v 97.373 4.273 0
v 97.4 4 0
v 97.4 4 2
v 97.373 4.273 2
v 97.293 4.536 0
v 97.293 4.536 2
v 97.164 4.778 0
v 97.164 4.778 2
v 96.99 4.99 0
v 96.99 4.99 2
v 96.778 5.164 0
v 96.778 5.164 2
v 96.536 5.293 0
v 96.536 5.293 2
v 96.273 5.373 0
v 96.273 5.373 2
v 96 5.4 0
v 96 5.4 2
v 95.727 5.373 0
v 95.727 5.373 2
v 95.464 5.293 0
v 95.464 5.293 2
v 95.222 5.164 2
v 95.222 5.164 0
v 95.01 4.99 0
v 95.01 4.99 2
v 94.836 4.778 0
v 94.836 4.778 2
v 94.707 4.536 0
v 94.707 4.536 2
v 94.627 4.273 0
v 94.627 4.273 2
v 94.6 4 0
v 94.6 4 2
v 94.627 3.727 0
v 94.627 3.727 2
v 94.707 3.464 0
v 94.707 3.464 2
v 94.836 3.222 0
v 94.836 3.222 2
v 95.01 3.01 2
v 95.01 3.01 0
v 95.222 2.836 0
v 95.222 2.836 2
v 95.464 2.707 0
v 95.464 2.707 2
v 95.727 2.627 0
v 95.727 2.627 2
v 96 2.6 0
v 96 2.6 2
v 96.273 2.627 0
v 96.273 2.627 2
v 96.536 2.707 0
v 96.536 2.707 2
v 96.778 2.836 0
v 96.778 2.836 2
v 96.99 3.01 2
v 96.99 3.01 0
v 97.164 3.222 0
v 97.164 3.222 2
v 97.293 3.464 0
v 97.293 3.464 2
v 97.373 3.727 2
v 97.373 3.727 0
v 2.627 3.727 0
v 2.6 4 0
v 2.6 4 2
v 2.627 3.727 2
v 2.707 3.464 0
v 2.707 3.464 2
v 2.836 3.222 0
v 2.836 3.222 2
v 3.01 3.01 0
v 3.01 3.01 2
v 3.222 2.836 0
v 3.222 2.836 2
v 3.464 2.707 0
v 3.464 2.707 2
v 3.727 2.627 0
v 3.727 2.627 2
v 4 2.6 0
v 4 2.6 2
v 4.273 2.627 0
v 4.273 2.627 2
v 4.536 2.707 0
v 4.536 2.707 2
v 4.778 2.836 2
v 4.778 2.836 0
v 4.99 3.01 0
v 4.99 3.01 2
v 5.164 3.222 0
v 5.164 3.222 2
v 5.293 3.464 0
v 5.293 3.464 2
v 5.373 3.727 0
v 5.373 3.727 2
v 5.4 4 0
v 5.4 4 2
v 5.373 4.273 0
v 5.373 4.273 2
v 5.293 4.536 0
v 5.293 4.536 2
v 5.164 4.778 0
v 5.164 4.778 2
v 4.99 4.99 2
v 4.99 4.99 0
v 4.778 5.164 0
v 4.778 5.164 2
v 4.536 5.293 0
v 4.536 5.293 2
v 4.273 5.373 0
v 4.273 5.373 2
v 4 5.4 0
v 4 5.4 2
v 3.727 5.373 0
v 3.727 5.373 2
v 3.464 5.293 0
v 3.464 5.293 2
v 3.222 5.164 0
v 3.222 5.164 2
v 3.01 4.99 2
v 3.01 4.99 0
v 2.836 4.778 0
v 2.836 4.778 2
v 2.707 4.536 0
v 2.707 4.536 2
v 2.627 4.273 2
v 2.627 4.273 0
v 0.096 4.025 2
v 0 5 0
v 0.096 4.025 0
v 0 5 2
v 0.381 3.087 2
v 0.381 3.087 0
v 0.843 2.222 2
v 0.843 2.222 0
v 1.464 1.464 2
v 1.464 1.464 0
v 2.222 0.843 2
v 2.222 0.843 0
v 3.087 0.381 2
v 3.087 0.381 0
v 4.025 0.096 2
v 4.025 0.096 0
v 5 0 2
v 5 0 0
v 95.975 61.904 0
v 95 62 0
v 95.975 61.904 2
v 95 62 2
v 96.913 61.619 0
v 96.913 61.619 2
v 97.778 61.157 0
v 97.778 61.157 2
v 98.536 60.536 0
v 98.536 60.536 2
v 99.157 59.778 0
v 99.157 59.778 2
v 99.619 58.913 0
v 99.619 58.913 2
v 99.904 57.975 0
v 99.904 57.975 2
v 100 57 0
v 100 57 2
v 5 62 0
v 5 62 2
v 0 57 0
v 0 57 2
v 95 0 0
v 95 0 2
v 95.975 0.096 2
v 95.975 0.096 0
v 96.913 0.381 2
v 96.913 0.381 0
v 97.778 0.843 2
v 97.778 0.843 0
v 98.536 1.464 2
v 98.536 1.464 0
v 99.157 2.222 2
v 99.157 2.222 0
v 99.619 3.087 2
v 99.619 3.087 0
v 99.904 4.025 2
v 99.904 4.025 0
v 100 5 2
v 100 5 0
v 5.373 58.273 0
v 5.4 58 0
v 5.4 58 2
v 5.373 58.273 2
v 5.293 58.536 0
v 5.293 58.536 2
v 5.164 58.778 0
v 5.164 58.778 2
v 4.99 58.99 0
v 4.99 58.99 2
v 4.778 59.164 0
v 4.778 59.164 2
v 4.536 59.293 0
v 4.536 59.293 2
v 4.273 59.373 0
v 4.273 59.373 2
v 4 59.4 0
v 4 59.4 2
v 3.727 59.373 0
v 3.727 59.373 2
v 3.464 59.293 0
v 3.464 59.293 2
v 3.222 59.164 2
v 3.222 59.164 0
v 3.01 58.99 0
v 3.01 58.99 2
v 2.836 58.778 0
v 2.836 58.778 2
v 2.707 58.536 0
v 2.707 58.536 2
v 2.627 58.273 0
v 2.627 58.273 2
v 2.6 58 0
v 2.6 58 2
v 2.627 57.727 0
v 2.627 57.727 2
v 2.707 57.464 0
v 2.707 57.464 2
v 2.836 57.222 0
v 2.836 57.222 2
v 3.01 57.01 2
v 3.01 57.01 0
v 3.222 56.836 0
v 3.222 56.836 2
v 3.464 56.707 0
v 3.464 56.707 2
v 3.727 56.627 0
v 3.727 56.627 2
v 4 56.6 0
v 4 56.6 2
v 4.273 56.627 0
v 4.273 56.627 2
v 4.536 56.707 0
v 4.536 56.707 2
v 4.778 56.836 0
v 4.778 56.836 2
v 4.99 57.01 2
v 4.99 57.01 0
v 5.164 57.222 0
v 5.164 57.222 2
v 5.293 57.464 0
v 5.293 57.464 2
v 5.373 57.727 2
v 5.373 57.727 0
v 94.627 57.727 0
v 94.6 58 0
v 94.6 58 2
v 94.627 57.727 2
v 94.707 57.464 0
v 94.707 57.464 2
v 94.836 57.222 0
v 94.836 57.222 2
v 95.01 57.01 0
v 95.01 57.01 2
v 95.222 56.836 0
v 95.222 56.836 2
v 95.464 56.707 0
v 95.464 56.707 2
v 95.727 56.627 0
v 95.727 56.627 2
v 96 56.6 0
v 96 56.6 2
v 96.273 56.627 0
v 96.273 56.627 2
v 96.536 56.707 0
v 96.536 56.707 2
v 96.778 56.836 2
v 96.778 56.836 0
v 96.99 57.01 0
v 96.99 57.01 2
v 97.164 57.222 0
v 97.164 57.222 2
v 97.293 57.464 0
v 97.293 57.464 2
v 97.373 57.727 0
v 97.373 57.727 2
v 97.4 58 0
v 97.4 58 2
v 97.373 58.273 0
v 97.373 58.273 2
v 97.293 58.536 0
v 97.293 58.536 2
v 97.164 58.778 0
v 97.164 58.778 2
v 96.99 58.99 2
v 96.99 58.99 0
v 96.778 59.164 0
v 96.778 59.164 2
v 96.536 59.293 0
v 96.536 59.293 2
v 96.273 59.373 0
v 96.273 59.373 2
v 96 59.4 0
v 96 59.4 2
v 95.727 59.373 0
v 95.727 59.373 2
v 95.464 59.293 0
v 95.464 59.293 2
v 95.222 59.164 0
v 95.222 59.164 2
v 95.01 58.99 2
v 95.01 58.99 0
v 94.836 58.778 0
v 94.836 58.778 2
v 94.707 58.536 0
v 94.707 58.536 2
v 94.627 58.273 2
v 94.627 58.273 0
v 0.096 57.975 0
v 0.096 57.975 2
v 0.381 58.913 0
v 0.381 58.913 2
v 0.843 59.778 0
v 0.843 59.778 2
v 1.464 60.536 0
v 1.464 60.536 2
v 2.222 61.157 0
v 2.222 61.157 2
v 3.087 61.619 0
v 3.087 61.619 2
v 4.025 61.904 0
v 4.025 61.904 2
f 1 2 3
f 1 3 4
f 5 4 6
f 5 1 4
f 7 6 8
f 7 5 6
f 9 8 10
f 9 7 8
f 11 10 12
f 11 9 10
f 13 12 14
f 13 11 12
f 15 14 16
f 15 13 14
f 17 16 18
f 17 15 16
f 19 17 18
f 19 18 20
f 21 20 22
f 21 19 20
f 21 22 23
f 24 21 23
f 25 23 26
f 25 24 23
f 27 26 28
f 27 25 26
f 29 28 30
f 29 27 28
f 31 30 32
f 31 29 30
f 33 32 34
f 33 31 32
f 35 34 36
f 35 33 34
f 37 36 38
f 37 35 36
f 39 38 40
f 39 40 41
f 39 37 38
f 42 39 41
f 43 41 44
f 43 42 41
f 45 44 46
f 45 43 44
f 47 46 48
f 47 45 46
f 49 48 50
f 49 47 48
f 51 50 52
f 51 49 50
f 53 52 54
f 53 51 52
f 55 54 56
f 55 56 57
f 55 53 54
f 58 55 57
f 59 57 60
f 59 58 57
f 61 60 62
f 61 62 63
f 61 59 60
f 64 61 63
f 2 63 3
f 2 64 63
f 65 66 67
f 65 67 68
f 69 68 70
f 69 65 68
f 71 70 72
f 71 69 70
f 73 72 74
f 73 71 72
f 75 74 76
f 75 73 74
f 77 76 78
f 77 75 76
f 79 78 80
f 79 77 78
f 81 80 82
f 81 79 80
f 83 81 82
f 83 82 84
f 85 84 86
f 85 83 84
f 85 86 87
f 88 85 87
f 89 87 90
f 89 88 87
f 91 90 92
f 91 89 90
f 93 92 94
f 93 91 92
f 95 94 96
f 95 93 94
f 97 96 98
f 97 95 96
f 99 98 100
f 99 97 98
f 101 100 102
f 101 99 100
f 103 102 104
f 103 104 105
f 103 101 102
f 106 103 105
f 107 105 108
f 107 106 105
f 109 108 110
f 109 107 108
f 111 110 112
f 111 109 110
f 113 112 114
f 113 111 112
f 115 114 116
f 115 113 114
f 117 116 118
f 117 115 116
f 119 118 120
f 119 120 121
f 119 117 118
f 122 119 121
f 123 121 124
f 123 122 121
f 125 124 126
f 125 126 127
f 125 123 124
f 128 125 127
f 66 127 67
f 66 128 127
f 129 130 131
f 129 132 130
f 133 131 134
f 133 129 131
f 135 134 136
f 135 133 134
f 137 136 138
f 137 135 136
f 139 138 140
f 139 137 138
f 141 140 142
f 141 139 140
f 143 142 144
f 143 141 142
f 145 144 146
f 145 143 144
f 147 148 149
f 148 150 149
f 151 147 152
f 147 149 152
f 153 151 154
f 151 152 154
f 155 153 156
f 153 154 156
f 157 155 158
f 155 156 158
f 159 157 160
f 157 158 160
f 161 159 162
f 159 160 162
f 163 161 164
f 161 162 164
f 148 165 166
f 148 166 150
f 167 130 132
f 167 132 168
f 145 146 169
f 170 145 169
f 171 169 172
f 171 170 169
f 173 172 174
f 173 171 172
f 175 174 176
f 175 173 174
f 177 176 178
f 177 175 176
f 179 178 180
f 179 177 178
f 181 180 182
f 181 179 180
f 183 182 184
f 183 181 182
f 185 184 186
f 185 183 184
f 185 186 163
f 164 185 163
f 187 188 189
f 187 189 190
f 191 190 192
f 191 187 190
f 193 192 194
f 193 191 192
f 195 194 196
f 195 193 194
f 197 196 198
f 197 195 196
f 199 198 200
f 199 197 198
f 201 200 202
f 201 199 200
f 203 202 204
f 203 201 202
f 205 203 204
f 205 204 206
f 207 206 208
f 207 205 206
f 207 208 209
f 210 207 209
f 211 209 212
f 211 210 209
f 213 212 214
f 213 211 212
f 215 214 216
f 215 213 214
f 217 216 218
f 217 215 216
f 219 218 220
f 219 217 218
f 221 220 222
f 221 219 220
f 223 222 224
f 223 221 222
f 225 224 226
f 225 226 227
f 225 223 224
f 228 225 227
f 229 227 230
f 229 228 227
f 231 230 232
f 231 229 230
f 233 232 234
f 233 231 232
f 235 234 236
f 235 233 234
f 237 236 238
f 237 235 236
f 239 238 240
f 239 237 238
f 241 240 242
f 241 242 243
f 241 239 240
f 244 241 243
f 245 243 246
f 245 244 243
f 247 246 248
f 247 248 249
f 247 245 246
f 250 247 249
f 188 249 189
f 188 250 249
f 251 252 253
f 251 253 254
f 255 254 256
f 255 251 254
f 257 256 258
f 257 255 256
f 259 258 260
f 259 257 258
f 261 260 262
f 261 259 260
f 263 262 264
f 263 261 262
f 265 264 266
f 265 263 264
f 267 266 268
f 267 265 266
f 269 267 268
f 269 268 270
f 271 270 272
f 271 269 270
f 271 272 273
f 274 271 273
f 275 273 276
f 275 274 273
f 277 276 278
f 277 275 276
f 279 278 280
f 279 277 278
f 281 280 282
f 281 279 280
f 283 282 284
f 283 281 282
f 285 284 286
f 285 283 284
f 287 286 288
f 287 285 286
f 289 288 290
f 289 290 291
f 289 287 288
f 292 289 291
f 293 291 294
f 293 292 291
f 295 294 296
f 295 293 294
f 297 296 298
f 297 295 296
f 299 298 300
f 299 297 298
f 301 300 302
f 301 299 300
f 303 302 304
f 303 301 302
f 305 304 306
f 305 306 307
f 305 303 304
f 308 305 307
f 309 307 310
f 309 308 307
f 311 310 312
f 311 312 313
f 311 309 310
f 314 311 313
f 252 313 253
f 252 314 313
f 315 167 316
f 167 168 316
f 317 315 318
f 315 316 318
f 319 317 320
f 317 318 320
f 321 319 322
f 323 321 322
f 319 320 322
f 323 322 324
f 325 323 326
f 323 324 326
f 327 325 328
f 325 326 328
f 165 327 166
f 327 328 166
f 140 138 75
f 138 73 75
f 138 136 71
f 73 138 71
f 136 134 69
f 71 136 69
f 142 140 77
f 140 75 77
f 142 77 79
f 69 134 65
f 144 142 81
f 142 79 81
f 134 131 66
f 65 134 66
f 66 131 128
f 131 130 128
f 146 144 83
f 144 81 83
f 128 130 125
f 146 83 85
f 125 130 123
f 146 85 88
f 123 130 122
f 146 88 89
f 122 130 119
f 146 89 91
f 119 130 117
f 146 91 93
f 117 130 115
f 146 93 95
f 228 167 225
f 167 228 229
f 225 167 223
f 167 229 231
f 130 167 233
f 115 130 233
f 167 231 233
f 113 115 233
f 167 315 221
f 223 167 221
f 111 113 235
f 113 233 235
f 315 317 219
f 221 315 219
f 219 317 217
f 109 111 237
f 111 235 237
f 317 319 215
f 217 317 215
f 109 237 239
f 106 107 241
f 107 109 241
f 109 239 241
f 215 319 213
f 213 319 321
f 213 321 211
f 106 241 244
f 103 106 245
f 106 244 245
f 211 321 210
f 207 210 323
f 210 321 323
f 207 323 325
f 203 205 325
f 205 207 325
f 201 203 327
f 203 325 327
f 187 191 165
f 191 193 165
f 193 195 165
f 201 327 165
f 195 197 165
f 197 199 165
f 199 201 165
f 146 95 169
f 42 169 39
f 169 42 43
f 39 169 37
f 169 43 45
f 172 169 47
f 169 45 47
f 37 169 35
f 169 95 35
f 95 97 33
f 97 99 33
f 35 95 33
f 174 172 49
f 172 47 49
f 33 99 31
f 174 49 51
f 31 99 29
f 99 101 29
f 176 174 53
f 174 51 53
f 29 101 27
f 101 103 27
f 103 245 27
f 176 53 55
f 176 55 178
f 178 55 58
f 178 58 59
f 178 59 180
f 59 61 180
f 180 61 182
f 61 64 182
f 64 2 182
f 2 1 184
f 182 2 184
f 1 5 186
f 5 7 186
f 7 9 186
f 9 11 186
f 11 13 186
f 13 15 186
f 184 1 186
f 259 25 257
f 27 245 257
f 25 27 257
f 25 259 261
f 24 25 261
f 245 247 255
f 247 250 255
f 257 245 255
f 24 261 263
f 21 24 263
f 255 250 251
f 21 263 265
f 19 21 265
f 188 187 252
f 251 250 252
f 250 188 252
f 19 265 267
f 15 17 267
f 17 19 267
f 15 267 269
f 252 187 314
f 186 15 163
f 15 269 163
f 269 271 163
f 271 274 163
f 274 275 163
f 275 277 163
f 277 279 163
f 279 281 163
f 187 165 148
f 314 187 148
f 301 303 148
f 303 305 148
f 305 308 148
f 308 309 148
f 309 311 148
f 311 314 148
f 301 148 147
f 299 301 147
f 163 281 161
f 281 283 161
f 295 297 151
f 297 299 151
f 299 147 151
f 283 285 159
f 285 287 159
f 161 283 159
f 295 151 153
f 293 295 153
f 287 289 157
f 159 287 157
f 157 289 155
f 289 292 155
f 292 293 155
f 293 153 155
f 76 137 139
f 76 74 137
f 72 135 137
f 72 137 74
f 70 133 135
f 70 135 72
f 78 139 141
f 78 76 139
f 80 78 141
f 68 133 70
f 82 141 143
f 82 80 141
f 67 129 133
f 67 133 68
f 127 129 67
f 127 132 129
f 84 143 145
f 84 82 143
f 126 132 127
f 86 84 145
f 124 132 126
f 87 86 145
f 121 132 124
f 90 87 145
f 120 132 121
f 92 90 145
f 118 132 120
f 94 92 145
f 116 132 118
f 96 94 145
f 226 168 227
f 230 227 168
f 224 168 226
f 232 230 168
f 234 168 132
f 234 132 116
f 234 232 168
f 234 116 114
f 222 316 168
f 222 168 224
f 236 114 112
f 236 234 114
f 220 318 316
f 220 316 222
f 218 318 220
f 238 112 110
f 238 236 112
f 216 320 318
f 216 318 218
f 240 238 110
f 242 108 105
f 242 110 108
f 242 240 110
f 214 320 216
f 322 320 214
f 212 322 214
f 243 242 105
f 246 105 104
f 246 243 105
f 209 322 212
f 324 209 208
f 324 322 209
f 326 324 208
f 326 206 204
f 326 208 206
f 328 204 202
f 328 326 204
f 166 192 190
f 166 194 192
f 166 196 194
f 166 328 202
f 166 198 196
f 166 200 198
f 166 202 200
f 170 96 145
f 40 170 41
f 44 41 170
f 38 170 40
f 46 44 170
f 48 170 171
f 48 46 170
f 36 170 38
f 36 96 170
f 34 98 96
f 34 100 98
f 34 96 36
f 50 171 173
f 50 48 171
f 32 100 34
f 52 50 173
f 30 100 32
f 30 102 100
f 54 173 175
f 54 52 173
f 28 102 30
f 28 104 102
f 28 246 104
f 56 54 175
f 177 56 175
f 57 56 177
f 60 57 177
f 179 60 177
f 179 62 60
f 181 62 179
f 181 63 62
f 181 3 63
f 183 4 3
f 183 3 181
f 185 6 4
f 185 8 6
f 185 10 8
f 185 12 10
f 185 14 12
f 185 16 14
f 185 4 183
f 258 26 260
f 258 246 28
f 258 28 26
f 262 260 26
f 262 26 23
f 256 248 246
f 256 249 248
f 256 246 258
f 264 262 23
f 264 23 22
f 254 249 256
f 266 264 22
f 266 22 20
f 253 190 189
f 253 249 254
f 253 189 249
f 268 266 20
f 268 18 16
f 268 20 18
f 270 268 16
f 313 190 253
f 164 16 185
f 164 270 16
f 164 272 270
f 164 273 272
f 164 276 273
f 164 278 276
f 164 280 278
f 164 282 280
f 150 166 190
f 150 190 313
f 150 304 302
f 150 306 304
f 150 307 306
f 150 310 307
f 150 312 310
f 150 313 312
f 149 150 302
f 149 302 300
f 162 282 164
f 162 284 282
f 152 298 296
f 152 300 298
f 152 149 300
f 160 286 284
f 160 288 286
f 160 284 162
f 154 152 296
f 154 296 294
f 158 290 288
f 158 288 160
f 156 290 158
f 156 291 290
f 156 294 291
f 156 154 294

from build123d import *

# Parameters (mm, degrees)
SKETCH_1_W      = 100
SKETCH_1_H      = 62
SKETCH_1_R      = 1.4
EXTRUDE_1_DEPTH = 2
FILLET_1_R      = 5


with BuildPart() as part:
    # 草图1 → 凸台-拉伸1 (new body)
    with BuildSketch(Plane.XY):
        with Locations((50, 31)):
            Rectangle(SKETCH_1_W, SKETCH_1_H)
        with Locations((4, 58)):
            Circle(SKETCH_1_R, mode=Mode.SUBTRACT)
        with Locations(Location((4, 4, 0), (0, 0, 180))):
            Circle(SKETCH_1_R, mode=Mode.SUBTRACT)
        with Locations((96, 4)):
            Circle(SKETCH_1_R, mode=Mode.SUBTRACT)
        with Locations(Location((96, 58, 0), (0, 0, 180))):
            Circle(SKETCH_1_R, mode=Mode.SUBTRACT)
    extrude(amount=EXTRUDE_1_DEPTH)

    # 圆角1
    fillet_1_edges = [part.edges().sort_by_distance(p)[0] for p in [
        (0, 62, 1),
        (100, 62, 1),
        (100, 0, 1),
        (0, 0, 1),
    ]]
    fillet(fillet_1_edges, radius=FILLET_1_R)


solid = part.part
